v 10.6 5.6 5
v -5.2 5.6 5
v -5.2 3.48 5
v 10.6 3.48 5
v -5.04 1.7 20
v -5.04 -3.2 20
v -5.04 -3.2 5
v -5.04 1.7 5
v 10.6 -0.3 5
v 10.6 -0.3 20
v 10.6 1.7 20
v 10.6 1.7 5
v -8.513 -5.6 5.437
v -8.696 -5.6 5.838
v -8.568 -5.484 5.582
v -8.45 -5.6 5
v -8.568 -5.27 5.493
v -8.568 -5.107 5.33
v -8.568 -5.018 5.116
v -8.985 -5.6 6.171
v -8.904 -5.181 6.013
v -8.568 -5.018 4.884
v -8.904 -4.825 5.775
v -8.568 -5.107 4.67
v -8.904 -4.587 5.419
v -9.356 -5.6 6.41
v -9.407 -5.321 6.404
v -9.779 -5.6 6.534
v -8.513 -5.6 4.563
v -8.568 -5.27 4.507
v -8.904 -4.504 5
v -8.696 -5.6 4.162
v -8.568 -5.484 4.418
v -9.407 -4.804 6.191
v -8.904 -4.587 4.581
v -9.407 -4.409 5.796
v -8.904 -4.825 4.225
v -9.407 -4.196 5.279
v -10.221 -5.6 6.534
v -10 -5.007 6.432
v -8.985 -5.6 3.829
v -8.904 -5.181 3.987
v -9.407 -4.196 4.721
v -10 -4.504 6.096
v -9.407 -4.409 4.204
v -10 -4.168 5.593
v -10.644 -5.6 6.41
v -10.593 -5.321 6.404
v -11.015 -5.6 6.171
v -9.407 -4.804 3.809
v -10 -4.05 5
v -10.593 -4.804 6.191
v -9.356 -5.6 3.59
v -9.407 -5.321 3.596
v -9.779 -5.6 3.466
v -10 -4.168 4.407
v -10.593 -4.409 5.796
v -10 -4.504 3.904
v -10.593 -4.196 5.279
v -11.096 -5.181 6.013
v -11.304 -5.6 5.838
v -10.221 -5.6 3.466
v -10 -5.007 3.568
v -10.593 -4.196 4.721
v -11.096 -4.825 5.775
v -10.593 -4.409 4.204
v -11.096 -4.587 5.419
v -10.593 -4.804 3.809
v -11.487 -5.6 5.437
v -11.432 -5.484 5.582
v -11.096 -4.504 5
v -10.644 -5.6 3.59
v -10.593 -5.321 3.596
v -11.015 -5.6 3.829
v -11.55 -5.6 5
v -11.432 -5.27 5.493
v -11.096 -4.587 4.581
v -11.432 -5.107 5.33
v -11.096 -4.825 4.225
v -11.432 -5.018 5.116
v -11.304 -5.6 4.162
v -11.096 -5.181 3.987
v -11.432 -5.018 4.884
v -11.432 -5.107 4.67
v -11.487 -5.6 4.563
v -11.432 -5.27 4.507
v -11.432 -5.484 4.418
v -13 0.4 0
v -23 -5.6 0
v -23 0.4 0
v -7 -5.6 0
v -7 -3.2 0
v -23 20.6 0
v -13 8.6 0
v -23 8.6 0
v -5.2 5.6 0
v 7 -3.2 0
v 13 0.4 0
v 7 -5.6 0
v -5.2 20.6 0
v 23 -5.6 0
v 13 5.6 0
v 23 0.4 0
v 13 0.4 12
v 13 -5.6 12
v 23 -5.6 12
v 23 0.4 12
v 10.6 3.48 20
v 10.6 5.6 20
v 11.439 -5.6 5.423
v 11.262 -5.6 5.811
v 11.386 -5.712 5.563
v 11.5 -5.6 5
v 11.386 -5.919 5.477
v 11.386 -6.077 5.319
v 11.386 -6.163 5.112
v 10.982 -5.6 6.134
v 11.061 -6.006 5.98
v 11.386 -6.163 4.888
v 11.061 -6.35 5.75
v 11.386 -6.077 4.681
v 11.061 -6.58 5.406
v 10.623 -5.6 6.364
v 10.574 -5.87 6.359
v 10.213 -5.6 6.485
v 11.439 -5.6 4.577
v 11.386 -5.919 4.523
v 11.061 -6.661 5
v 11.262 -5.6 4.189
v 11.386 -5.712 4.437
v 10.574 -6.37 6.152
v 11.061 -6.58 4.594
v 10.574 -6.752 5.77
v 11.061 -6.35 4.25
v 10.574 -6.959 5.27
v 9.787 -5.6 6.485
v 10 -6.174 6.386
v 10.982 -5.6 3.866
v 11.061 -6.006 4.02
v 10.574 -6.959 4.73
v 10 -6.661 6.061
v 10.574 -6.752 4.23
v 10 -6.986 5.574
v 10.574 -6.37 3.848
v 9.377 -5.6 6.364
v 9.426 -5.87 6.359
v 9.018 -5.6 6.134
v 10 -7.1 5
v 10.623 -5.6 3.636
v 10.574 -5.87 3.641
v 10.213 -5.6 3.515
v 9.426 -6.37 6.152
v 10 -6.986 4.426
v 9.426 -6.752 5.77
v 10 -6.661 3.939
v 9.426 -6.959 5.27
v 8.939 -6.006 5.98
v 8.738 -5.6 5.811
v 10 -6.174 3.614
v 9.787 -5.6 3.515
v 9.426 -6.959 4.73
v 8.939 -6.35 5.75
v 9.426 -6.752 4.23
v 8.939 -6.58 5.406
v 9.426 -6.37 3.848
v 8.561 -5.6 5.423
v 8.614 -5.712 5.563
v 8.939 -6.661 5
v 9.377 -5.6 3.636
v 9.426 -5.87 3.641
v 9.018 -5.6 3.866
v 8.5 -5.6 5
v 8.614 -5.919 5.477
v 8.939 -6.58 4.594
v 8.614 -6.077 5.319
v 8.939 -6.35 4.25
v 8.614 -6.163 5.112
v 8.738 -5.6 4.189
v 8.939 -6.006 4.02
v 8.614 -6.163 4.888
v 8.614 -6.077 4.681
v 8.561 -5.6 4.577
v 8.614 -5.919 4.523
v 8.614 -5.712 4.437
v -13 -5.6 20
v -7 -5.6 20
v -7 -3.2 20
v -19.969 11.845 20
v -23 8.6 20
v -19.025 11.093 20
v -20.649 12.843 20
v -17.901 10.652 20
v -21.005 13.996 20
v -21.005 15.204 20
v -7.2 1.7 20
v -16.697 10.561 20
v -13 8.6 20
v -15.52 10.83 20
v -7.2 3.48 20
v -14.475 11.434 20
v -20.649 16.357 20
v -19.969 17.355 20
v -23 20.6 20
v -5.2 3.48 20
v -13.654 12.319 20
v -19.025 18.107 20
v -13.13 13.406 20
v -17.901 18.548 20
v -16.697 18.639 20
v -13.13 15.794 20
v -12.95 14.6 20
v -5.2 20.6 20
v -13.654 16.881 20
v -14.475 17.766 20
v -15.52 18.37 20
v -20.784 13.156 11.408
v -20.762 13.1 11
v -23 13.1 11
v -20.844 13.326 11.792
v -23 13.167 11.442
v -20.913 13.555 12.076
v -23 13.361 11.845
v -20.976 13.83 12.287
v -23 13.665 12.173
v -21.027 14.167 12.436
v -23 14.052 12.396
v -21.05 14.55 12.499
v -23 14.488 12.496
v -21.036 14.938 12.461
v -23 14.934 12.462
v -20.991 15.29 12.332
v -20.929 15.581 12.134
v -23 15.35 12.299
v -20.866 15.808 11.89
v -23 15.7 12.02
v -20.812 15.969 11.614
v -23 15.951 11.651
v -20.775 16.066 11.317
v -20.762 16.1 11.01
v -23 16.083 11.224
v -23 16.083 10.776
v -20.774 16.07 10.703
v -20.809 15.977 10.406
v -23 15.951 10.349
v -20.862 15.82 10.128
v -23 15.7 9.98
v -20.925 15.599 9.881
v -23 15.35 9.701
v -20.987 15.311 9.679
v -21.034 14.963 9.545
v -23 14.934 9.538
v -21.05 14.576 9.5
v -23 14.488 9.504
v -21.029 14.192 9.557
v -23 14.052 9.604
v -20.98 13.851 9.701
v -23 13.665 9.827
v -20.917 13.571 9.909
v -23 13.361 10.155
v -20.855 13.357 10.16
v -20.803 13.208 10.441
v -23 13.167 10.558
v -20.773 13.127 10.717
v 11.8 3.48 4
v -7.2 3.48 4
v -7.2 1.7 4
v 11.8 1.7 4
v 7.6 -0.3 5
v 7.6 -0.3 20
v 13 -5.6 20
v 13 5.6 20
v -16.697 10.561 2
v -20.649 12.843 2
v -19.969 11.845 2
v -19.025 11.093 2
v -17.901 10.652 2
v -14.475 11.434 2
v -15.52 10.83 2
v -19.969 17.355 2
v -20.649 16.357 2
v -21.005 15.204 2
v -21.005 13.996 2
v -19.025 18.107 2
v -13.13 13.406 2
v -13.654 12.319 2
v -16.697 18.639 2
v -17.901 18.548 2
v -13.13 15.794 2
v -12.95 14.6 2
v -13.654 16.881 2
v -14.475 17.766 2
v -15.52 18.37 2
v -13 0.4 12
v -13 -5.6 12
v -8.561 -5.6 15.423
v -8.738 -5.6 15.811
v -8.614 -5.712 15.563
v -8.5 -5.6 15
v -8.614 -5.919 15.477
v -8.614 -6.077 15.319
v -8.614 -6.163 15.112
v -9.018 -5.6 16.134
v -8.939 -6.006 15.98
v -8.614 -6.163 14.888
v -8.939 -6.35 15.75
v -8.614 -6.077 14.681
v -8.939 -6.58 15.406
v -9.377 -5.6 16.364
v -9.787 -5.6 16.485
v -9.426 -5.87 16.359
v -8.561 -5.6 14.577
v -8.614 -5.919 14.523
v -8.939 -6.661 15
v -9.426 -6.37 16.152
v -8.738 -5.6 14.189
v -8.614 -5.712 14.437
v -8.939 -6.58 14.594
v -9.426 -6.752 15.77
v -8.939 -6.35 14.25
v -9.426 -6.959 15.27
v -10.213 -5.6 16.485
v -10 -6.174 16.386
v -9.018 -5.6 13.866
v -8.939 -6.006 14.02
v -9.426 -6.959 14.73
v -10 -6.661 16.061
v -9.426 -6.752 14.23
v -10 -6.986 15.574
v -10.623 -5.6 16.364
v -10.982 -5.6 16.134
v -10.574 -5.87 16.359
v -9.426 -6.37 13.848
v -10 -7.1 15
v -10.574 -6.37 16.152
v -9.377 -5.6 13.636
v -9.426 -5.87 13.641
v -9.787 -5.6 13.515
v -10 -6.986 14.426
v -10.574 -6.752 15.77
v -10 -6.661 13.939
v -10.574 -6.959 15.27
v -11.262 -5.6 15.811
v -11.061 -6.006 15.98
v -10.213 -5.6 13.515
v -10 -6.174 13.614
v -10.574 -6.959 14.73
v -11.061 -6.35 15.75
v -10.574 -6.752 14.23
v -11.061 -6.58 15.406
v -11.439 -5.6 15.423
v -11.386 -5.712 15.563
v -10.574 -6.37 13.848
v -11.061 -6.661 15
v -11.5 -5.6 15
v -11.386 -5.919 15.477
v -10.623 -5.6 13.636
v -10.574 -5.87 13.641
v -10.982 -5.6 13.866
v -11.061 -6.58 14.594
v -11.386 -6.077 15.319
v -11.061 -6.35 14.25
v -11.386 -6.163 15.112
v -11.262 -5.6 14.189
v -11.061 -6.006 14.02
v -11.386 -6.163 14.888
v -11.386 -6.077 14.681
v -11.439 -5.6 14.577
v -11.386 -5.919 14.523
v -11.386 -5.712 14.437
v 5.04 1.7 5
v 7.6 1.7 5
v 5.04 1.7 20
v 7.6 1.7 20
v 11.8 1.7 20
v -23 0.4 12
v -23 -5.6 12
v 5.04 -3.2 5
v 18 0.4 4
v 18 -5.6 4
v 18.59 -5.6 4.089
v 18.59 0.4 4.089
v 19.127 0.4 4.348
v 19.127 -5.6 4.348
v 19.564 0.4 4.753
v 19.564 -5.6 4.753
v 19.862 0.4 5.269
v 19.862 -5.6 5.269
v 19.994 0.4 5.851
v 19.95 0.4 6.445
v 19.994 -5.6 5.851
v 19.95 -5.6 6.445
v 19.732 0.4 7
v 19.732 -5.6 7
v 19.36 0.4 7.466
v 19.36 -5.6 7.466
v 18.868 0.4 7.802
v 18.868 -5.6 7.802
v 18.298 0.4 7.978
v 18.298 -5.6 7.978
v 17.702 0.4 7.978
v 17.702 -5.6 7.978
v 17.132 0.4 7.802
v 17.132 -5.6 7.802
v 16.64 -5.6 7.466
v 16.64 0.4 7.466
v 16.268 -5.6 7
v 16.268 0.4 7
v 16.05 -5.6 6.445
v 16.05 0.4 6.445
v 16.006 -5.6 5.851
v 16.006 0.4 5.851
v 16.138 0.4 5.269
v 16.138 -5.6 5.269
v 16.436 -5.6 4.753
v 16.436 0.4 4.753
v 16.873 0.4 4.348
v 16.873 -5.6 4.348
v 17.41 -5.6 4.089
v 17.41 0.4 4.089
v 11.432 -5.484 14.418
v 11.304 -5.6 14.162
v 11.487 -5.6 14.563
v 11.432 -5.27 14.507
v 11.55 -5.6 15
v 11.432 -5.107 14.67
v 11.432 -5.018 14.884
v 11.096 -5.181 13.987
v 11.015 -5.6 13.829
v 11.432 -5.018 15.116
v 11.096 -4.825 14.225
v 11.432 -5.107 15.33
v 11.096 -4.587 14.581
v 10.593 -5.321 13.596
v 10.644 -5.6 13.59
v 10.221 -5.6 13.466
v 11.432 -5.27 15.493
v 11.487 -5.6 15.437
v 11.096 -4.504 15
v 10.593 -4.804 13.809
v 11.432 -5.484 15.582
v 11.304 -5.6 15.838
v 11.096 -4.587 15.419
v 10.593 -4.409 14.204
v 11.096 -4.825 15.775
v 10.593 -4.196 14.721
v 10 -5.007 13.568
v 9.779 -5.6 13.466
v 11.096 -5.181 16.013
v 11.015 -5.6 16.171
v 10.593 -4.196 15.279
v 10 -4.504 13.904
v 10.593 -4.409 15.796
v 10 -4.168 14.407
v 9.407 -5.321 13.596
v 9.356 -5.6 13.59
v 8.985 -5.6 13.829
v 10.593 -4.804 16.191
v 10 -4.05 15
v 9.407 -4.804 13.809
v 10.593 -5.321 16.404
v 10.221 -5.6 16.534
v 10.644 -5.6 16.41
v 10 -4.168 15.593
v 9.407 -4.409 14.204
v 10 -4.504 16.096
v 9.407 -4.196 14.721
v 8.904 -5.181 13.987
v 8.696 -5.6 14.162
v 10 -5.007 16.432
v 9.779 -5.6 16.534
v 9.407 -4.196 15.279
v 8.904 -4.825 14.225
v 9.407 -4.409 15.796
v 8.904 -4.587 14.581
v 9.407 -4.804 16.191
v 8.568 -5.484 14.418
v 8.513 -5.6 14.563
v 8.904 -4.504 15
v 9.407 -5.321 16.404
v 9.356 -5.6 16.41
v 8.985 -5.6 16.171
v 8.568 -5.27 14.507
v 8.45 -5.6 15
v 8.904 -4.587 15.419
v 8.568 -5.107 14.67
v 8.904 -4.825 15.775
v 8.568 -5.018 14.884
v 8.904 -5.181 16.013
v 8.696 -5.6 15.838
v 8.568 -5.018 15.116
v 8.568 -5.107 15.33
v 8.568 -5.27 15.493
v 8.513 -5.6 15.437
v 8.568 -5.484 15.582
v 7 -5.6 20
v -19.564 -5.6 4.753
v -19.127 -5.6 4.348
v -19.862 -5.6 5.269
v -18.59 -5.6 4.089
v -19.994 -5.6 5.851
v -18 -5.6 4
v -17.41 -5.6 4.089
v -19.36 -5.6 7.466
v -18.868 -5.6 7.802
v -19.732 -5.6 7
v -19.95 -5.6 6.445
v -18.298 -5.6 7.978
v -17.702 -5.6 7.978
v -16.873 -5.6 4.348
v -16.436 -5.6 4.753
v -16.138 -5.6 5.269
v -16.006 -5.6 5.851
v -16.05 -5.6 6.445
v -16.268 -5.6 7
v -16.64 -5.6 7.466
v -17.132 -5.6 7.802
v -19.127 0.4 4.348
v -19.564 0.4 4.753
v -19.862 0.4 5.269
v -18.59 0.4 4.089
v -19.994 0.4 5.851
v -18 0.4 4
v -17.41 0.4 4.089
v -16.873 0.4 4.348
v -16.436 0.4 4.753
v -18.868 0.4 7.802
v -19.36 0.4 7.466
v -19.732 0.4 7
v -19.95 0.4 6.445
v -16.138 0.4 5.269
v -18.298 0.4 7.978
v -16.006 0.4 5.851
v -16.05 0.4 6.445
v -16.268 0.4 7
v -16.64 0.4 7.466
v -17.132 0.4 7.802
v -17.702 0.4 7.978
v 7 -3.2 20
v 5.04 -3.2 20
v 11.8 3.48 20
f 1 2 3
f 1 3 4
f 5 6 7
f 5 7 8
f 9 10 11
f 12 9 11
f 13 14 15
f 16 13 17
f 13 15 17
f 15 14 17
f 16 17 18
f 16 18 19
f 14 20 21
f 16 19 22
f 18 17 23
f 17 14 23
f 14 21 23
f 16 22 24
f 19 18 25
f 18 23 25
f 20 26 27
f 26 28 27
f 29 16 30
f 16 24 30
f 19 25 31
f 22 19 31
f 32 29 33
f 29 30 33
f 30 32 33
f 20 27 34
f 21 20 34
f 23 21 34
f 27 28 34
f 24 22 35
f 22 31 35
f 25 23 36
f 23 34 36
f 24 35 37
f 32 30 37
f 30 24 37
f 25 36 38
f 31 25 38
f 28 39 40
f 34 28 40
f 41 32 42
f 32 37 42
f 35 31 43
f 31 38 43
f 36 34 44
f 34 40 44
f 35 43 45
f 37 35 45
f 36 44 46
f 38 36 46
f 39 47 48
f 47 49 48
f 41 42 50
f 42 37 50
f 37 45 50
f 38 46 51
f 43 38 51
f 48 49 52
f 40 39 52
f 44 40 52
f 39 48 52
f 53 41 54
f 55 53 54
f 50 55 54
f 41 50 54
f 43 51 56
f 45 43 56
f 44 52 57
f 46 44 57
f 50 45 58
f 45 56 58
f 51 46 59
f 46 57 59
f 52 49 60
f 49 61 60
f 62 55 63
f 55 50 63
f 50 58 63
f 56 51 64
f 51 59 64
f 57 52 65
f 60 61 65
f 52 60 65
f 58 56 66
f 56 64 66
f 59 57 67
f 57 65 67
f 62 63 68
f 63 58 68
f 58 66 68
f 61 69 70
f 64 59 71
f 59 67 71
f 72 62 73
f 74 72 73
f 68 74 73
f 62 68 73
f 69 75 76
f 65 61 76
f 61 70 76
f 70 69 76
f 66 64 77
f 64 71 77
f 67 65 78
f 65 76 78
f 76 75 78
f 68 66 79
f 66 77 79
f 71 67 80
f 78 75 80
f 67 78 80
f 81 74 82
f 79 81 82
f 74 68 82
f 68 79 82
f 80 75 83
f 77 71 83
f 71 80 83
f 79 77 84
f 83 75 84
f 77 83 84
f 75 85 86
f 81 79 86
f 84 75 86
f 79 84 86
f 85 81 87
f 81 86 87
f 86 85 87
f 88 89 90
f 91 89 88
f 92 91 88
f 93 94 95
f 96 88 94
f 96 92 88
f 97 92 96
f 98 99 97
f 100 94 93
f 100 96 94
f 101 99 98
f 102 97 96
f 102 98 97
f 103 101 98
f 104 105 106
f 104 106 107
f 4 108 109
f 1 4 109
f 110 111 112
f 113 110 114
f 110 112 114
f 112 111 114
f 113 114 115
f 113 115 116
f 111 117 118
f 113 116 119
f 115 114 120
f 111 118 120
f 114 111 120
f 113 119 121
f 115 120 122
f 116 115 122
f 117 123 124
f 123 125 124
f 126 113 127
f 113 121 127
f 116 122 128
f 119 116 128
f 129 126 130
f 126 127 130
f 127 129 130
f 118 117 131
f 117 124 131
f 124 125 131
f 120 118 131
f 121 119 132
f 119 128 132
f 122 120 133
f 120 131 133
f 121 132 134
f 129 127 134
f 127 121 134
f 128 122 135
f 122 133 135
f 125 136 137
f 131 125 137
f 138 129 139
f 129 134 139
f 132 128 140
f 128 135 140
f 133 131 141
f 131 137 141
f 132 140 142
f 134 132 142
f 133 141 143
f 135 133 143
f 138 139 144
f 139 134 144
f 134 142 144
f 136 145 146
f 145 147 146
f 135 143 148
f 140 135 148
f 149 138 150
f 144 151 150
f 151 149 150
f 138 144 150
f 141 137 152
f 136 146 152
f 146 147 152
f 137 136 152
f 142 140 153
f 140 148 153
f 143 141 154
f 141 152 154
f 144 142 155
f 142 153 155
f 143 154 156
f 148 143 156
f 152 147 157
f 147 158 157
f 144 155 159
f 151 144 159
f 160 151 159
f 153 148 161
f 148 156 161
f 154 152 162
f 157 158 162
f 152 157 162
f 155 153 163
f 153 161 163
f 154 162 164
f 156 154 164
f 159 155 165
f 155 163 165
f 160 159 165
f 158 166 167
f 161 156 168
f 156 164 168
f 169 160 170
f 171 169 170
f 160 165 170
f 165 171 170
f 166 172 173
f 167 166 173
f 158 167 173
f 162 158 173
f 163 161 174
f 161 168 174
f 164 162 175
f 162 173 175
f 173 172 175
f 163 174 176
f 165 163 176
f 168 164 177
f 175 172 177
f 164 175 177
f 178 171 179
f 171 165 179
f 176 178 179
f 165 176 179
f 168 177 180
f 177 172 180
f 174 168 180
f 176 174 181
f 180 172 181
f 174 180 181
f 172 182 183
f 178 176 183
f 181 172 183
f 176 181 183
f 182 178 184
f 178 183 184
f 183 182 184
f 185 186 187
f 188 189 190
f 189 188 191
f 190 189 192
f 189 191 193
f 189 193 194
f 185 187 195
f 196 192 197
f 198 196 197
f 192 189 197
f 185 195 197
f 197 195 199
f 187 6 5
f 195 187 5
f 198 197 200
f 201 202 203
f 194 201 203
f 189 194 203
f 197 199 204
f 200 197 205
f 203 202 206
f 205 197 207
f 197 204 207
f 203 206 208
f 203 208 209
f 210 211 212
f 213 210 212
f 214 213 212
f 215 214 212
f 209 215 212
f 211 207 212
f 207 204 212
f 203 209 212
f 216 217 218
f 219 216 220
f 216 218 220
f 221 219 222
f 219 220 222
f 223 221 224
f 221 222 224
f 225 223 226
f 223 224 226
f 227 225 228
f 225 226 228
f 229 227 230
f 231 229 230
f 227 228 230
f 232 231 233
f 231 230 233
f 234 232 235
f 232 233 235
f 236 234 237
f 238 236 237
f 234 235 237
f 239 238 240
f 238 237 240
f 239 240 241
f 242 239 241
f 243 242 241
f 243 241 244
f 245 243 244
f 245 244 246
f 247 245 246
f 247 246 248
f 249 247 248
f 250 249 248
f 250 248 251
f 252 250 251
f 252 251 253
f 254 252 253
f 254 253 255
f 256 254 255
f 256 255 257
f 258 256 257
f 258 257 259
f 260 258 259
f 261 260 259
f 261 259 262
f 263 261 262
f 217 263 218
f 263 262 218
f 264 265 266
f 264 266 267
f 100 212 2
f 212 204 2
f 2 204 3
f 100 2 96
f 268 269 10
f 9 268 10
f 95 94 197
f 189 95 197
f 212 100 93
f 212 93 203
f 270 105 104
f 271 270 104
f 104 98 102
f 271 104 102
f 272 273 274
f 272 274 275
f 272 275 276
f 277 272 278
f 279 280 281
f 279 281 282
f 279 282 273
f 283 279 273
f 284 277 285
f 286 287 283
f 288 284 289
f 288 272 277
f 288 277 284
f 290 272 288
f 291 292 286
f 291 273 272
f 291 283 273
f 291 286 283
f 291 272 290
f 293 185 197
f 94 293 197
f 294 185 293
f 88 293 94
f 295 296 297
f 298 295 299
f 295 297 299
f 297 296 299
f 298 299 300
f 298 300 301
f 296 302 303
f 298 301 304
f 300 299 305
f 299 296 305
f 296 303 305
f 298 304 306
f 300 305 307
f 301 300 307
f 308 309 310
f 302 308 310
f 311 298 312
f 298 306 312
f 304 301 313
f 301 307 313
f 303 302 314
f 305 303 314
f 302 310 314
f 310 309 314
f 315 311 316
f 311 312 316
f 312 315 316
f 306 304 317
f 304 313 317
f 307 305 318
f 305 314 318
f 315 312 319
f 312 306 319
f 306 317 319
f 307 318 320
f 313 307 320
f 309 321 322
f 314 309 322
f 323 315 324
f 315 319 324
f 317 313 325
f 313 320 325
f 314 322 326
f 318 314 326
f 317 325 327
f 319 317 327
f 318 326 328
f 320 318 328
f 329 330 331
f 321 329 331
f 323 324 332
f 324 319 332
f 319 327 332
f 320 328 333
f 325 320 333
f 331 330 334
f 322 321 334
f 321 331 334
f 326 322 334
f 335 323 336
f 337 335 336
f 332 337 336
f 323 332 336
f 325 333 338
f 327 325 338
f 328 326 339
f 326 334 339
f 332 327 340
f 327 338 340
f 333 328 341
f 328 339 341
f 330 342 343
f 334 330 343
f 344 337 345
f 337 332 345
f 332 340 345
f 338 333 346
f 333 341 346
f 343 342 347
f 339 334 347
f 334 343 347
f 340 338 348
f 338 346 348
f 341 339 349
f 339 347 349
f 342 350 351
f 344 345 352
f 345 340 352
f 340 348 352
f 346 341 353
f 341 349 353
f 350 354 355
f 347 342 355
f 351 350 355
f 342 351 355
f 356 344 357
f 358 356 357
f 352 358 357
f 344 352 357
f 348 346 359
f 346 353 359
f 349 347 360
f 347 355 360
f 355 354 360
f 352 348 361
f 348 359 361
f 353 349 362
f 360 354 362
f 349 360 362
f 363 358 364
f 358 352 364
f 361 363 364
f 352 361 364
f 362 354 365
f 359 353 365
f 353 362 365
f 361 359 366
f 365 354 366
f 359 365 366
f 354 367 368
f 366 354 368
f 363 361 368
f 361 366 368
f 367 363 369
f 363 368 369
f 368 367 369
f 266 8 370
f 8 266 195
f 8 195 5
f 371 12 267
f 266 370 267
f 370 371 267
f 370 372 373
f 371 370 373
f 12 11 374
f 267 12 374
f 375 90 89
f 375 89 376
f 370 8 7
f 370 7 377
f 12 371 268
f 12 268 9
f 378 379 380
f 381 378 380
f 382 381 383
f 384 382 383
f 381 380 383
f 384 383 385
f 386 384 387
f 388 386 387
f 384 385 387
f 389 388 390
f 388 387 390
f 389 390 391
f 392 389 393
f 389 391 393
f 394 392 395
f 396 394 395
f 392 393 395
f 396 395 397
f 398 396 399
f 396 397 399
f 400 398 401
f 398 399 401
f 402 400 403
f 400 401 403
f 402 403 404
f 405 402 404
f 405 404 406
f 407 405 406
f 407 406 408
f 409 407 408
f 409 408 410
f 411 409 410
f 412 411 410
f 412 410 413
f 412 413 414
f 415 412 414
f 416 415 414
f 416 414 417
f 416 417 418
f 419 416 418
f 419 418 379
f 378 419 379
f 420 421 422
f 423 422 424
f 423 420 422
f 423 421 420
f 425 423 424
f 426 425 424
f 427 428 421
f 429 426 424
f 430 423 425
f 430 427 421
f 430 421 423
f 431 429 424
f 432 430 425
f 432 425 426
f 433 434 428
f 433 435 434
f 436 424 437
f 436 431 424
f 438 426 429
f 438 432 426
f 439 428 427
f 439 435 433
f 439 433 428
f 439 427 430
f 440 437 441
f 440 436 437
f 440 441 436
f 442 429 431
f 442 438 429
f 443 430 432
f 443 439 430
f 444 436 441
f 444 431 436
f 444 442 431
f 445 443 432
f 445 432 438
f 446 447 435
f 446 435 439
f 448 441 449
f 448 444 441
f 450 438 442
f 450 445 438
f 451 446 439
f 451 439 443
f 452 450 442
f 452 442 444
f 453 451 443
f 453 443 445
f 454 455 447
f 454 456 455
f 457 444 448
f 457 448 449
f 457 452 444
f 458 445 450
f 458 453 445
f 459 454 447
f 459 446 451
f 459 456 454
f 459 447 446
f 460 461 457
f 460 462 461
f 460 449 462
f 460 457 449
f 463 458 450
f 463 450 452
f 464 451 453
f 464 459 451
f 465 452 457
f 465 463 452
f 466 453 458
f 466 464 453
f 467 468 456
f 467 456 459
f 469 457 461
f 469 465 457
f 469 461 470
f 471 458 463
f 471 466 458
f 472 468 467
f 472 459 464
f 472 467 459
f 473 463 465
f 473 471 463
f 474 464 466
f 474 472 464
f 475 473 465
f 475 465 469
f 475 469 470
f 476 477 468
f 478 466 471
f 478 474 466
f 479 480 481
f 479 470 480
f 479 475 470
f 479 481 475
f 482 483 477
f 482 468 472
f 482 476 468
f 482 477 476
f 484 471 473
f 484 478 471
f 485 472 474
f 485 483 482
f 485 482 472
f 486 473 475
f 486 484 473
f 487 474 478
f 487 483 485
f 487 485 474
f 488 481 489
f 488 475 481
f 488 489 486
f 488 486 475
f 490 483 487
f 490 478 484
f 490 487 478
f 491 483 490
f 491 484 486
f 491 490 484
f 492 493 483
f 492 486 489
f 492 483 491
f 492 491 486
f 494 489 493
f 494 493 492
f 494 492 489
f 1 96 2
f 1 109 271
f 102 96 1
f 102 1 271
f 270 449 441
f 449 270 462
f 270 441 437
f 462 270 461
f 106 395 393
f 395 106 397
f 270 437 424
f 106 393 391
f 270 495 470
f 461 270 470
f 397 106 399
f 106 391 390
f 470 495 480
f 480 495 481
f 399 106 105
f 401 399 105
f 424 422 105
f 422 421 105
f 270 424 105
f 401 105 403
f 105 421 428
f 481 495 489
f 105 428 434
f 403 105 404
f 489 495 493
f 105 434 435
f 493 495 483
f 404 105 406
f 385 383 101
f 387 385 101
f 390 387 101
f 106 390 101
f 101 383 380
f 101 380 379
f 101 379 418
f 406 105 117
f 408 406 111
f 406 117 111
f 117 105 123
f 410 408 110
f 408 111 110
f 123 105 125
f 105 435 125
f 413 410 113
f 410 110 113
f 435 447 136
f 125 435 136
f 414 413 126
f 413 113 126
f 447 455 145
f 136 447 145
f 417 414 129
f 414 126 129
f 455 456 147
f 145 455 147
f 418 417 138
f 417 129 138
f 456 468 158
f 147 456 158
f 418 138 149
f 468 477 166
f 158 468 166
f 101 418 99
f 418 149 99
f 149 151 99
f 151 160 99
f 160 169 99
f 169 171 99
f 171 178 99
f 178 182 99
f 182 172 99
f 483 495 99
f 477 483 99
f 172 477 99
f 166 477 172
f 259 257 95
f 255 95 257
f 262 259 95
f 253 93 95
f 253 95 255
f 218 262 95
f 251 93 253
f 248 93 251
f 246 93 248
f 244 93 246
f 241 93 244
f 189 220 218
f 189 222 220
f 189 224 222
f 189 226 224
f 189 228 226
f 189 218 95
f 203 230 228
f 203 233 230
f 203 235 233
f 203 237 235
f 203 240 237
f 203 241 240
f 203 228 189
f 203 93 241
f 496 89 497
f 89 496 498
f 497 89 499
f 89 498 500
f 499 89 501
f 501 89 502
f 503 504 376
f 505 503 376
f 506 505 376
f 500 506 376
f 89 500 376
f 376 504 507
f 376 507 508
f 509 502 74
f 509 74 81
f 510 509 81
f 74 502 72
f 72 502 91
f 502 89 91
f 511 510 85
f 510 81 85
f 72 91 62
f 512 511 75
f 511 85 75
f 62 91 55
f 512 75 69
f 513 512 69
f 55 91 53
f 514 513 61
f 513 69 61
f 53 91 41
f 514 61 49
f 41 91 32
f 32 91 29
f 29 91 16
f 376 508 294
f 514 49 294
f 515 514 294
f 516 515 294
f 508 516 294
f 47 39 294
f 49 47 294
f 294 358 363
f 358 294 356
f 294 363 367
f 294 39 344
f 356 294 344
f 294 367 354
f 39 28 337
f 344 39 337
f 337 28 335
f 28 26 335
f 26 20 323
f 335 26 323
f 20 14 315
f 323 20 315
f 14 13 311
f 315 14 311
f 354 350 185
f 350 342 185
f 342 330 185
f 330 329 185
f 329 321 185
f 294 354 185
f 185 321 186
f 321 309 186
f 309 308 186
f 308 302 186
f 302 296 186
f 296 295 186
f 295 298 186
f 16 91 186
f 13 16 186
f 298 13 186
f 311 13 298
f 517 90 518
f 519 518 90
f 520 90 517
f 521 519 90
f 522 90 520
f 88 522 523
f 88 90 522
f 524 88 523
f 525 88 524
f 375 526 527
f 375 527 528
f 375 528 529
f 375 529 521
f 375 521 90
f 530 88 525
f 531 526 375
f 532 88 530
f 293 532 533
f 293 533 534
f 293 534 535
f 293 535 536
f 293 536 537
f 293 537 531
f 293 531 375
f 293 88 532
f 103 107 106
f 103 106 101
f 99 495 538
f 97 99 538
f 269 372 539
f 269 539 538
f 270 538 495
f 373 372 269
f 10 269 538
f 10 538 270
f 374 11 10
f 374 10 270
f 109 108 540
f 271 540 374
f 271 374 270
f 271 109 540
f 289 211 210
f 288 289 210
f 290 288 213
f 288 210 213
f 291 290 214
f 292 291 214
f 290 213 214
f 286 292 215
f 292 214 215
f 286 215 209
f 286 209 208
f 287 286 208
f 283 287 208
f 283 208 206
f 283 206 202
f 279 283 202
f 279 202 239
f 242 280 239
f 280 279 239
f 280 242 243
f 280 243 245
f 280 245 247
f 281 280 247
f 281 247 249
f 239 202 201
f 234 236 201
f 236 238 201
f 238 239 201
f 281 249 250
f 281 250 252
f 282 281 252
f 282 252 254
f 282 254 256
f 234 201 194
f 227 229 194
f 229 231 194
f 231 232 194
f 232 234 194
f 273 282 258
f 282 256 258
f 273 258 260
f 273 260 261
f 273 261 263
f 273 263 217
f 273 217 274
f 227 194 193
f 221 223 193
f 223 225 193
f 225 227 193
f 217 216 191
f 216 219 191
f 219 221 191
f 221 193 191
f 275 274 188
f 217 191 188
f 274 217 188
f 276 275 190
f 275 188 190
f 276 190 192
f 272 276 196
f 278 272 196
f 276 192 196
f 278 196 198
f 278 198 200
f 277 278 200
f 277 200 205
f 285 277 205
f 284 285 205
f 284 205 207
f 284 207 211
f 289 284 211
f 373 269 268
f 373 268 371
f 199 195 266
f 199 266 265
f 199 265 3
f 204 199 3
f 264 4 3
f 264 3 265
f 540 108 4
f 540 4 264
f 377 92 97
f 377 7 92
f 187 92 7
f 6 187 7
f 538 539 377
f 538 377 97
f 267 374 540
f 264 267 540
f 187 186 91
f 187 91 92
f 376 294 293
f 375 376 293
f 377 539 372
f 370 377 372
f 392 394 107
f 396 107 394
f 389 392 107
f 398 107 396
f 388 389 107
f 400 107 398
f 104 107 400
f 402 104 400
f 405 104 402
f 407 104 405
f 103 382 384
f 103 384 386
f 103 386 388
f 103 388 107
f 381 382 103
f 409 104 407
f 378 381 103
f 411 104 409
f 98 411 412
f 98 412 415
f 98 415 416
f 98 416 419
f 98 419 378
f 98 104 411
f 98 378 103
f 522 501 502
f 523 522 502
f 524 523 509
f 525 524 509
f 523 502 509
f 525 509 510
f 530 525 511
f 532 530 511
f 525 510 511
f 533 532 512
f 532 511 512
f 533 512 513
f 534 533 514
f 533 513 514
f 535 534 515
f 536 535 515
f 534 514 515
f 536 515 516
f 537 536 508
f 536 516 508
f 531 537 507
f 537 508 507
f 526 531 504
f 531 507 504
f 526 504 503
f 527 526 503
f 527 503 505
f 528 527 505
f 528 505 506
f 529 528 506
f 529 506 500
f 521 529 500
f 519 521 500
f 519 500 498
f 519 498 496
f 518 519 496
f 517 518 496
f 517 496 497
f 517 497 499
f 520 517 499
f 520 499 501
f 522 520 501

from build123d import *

# Parameters (mm, degrees)
SKETCH2_W           = 26
SKETCH2_H           = 11.2
BOSS_EXTRUDE1_DEPTH = 20
SKETCH6_W           = 14
SKETCH6_H           = 2.4
CUT_EXTRUDE1_DEPTH  = 20
SKETCH7_W           = 10.08
SKETCH7_H           = 4.9
CUT_EXTRUDE2_DEPTH  = 15
SKETCH8_W           = 19
SKETCH8_H           = 1.78
CUT_EXTRUDE3_DEPTH  = 16
SKETCH9_W           = 15.8
SKETCH9_H           = 2.12
CUT_EXTRUDE4_DEPTH  = 15
SKETCH10_W          = 3
SKETCH10_H          = 2
CUT_EXTRUDE5_DEPTH  = 15
CUT_REVOLVE3_ANGLE  = 180
SKETCH15_W          = 12
SKETCH15_H          = 6
BOSS_EXTRUDE2_DEPTH = 10
SKETCH16_W          = 12
SKETCH16_H          = 6
BOSS_EXTRUDE3_DEPTH = 10
SKETCH17_R          = 2
CUT_EXTRUDE6_DEPTH  = 12
SKETCH18_R          = 2
CUT_EXTRUDE7_DEPTH  = 12
SKETCH19_W          = 7.8
SKETCH19_H          = 20
BOSS_EXTRUDE4_DEPTH = 15
SKETCH20_W          = 20
SKETCH20_H          = 12
BOSS_EXTRUDE5_DEPTH = 10
SKETCH21_R          = 4.05
CUT_EXTRUDE8_DEPTH  = 18
SKETCH22_R          = 1.5
CUT_EXTRUDE9_DEPTH  = 5


with BuildPart() as part:
    # Sketch2 → Boss-Extrude1 (new body)
    with BuildSketch(Plane.XY):
        Rectangle(SKETCH2_W, SKETCH2_H)
    extrude(amount=BOSS_EXTRUDE1_DEPTH)

    # Sketch6 → Cut-Extrude1 (cut)
    with BuildSketch(Plane.XY.offset(20)):
        with Locations((0, -4.4)):
            Rectangle(SKETCH6_W, SKETCH6_H)
    extrude(amount=-CUT_EXTRUDE1_DEPTH, mode=Mode.SUBTRACT)

    # Sketch7 → Cut-Extrude2 (cut)
    with BuildSketch(Plane.XY.offset(20)):
        with Locations((0, -0.75)):
            Rectangle(SKETCH7_W, SKETCH7_H)
    extrude(amount=-CUT_EXTRUDE2_DEPTH, mode=Mode.SUBTRACT)

    # Sketch8 → Cut-Extrude3 (cut)
    with BuildSketch(Plane.XY.offset(20)):
        with Locations((2.3, 2.59)):
            Rectangle(SKETCH8_W, SKETCH8_H)
    extrude(amount=-CUT_EXTRUDE3_DEPTH, mode=Mode.SUBTRACT)

    # Sketch9 → Cut-Extrude4 (cut)
    with BuildSketch(Plane.XY.offset(20)):
        with Locations((2.7, 4.54)):
            Rectangle(SKETCH9_W, SKETCH9_H)
    extrude(amount=-CUT_EXTRUDE4_DEPTH, mode=Mode.SUBTRACT)

    # Sketch10 → Cut-Extrude5 (cut)
    with BuildSketch(Plane.XY.offset(20)):
        with Locations((9.1, 0.7)):
            Rectangle(SKETCH10_W, SKETCH10_H)
    extrude(amount=-CUT_EXTRUDE5_DEPTH, mode=Mode.SUBTRACT)

    # Sketch11 → Cut-Revolve3 (revolve, cut)
    with BuildSketch(Plane.XZ.offset(5.6)):
        with BuildLine():
            Line((-11.55, 5), (-8.45, 5))
            ThreePointArc((-8.45, 5), (-10, 6.55), (-11.55, 5))
        make_face()
    revolve(axis=Axis((-11.55, -5.6, 5), (-1, 0, 0)), revolution_arc=CUT_REVOLVE3_ANGLE, mode=Mode.SUBTRACT)

    # Sketch12 → Revolve2 (revolve)
    with BuildSketch(Plane.XZ.offset(5.6)):
        with BuildLine():
            Line((-11.5, 15), (-8.5, 15))
            ThreePointArc((-8.5, 15), (-10, 13.5), (-11.5, 15))
        make_face()
    revolve(axis=Axis((-11.5, -5.6, 15), (1, 0, 0)))

    # Sketch14 → Cut-Revolve4 (revolve, cut)
    with BuildSketch(Plane.XZ.offset(5.6)):
        with BuildLine():
            Line((8.45, 15), (11.55, 15))
            ThreePointArc((11.55, 15), (10, 13.45), (8.45, 15))
        make_face()
    revolve(axis=Axis((8.45, -5.6, 15), (1, 0, 0)), mode=Mode.SUBTRACT)

    # Sketch13 → Revolve3 (revolve)
    with BuildSketch(Plane.XZ.offset(5.6)):
        with BuildLine():
            Line((8.5, 5), (11.5, 5))
            ThreePointArc((11.5, 5), (10, 6.5), (8.5, 5))
        make_face()
    revolve(axis=Axis((8.5, -5.6, 5), (1, 0, 0)))

    # Sketch15 → Boss-Extrude2 (add)
    with BuildSketch(Plane.ZY.offset(13)):
        with Locations((6, -2.6)):
            Rectangle(SKETCH15_W, SKETCH15_H)
    extrude(amount=BOSS_EXTRUDE2_DEPTH)

    # Sketch16 → Boss-Extrude3 (add)
    with BuildSketch(Plane(origin=(13, 0, 0), x_dir=(0, 0, -1), z_dir=(1, 0, 0))):
        with Locations((-6, -2.6)):
            Rectangle(SKETCH16_W, SKETCH16_H)
    extrude(amount=BOSS_EXTRUDE3_DEPTH)

    # Sketch17 → Cut-Extrude6 (cut)
    with BuildSketch(Plane.XZ.offset(5.6)):
        with Locations(Location((-18, 6, 0), (0, 0, 270))):
            Circle(SKETCH17_R)
    extrude(amount=-CUT_EXTRUDE6_DEPTH, mode=Mode.SUBTRACT)

    # Sketch18 → Cut-Extrude7 (cut)
    with BuildSketch(Plane.XZ.offset(5.6)):
        with Locations(Location((18, 6, 0), (0, 0, 270))):
            Circle(SKETCH18_R)
    extrude(amount=-CUT_EXTRUDE7_DEPTH, mode=Mode.SUBTRACT)

    # Sketch19 → Boss-Extrude4 (add)
    with BuildSketch(Plane(origin=(0, 5.6, 0), x_dir=(1, 0, 0), z_dir=(0, 1, 0))):
        with Locations((-9.1, -10)):
            Rectangle(SKETCH19_W, SKETCH19_H)
    extrude(amount=BOSS_EXTRUDE4_DEPTH)

    # Sketch20 → Boss-Extrude5 (add)
    with BuildSketch(Plane.ZY.offset(13)):
        with Locations((10, 14.6)):
            Rectangle(SKETCH20_W, SKETCH20_H)
    extrude(amount=BOSS_EXTRUDE5_DEPTH)

    # Sketch21 → Cut-Extrude8 (cut)
    with BuildSketch(Plane.XY.offset(20)):
        with Locations((-17, 14.6)):
            Circle(SKETCH21_R)
    extrude(amount=-CUT_EXTRUDE8_DEPTH, mode=Mode.SUBTRACT)

    # Sketch22 → Cut-Extrude9 (cut)
    with BuildSketch(Plane.ZY.offset(23)):
        with Locations(Location((11, 14.6, 0), (0, 0, 270))):
            Circle(SKETCH22_R)
    extrude(amount=-CUT_EXTRUDE9_DEPTH, mode=Mode.SUBTRACT)


solid = part.part
